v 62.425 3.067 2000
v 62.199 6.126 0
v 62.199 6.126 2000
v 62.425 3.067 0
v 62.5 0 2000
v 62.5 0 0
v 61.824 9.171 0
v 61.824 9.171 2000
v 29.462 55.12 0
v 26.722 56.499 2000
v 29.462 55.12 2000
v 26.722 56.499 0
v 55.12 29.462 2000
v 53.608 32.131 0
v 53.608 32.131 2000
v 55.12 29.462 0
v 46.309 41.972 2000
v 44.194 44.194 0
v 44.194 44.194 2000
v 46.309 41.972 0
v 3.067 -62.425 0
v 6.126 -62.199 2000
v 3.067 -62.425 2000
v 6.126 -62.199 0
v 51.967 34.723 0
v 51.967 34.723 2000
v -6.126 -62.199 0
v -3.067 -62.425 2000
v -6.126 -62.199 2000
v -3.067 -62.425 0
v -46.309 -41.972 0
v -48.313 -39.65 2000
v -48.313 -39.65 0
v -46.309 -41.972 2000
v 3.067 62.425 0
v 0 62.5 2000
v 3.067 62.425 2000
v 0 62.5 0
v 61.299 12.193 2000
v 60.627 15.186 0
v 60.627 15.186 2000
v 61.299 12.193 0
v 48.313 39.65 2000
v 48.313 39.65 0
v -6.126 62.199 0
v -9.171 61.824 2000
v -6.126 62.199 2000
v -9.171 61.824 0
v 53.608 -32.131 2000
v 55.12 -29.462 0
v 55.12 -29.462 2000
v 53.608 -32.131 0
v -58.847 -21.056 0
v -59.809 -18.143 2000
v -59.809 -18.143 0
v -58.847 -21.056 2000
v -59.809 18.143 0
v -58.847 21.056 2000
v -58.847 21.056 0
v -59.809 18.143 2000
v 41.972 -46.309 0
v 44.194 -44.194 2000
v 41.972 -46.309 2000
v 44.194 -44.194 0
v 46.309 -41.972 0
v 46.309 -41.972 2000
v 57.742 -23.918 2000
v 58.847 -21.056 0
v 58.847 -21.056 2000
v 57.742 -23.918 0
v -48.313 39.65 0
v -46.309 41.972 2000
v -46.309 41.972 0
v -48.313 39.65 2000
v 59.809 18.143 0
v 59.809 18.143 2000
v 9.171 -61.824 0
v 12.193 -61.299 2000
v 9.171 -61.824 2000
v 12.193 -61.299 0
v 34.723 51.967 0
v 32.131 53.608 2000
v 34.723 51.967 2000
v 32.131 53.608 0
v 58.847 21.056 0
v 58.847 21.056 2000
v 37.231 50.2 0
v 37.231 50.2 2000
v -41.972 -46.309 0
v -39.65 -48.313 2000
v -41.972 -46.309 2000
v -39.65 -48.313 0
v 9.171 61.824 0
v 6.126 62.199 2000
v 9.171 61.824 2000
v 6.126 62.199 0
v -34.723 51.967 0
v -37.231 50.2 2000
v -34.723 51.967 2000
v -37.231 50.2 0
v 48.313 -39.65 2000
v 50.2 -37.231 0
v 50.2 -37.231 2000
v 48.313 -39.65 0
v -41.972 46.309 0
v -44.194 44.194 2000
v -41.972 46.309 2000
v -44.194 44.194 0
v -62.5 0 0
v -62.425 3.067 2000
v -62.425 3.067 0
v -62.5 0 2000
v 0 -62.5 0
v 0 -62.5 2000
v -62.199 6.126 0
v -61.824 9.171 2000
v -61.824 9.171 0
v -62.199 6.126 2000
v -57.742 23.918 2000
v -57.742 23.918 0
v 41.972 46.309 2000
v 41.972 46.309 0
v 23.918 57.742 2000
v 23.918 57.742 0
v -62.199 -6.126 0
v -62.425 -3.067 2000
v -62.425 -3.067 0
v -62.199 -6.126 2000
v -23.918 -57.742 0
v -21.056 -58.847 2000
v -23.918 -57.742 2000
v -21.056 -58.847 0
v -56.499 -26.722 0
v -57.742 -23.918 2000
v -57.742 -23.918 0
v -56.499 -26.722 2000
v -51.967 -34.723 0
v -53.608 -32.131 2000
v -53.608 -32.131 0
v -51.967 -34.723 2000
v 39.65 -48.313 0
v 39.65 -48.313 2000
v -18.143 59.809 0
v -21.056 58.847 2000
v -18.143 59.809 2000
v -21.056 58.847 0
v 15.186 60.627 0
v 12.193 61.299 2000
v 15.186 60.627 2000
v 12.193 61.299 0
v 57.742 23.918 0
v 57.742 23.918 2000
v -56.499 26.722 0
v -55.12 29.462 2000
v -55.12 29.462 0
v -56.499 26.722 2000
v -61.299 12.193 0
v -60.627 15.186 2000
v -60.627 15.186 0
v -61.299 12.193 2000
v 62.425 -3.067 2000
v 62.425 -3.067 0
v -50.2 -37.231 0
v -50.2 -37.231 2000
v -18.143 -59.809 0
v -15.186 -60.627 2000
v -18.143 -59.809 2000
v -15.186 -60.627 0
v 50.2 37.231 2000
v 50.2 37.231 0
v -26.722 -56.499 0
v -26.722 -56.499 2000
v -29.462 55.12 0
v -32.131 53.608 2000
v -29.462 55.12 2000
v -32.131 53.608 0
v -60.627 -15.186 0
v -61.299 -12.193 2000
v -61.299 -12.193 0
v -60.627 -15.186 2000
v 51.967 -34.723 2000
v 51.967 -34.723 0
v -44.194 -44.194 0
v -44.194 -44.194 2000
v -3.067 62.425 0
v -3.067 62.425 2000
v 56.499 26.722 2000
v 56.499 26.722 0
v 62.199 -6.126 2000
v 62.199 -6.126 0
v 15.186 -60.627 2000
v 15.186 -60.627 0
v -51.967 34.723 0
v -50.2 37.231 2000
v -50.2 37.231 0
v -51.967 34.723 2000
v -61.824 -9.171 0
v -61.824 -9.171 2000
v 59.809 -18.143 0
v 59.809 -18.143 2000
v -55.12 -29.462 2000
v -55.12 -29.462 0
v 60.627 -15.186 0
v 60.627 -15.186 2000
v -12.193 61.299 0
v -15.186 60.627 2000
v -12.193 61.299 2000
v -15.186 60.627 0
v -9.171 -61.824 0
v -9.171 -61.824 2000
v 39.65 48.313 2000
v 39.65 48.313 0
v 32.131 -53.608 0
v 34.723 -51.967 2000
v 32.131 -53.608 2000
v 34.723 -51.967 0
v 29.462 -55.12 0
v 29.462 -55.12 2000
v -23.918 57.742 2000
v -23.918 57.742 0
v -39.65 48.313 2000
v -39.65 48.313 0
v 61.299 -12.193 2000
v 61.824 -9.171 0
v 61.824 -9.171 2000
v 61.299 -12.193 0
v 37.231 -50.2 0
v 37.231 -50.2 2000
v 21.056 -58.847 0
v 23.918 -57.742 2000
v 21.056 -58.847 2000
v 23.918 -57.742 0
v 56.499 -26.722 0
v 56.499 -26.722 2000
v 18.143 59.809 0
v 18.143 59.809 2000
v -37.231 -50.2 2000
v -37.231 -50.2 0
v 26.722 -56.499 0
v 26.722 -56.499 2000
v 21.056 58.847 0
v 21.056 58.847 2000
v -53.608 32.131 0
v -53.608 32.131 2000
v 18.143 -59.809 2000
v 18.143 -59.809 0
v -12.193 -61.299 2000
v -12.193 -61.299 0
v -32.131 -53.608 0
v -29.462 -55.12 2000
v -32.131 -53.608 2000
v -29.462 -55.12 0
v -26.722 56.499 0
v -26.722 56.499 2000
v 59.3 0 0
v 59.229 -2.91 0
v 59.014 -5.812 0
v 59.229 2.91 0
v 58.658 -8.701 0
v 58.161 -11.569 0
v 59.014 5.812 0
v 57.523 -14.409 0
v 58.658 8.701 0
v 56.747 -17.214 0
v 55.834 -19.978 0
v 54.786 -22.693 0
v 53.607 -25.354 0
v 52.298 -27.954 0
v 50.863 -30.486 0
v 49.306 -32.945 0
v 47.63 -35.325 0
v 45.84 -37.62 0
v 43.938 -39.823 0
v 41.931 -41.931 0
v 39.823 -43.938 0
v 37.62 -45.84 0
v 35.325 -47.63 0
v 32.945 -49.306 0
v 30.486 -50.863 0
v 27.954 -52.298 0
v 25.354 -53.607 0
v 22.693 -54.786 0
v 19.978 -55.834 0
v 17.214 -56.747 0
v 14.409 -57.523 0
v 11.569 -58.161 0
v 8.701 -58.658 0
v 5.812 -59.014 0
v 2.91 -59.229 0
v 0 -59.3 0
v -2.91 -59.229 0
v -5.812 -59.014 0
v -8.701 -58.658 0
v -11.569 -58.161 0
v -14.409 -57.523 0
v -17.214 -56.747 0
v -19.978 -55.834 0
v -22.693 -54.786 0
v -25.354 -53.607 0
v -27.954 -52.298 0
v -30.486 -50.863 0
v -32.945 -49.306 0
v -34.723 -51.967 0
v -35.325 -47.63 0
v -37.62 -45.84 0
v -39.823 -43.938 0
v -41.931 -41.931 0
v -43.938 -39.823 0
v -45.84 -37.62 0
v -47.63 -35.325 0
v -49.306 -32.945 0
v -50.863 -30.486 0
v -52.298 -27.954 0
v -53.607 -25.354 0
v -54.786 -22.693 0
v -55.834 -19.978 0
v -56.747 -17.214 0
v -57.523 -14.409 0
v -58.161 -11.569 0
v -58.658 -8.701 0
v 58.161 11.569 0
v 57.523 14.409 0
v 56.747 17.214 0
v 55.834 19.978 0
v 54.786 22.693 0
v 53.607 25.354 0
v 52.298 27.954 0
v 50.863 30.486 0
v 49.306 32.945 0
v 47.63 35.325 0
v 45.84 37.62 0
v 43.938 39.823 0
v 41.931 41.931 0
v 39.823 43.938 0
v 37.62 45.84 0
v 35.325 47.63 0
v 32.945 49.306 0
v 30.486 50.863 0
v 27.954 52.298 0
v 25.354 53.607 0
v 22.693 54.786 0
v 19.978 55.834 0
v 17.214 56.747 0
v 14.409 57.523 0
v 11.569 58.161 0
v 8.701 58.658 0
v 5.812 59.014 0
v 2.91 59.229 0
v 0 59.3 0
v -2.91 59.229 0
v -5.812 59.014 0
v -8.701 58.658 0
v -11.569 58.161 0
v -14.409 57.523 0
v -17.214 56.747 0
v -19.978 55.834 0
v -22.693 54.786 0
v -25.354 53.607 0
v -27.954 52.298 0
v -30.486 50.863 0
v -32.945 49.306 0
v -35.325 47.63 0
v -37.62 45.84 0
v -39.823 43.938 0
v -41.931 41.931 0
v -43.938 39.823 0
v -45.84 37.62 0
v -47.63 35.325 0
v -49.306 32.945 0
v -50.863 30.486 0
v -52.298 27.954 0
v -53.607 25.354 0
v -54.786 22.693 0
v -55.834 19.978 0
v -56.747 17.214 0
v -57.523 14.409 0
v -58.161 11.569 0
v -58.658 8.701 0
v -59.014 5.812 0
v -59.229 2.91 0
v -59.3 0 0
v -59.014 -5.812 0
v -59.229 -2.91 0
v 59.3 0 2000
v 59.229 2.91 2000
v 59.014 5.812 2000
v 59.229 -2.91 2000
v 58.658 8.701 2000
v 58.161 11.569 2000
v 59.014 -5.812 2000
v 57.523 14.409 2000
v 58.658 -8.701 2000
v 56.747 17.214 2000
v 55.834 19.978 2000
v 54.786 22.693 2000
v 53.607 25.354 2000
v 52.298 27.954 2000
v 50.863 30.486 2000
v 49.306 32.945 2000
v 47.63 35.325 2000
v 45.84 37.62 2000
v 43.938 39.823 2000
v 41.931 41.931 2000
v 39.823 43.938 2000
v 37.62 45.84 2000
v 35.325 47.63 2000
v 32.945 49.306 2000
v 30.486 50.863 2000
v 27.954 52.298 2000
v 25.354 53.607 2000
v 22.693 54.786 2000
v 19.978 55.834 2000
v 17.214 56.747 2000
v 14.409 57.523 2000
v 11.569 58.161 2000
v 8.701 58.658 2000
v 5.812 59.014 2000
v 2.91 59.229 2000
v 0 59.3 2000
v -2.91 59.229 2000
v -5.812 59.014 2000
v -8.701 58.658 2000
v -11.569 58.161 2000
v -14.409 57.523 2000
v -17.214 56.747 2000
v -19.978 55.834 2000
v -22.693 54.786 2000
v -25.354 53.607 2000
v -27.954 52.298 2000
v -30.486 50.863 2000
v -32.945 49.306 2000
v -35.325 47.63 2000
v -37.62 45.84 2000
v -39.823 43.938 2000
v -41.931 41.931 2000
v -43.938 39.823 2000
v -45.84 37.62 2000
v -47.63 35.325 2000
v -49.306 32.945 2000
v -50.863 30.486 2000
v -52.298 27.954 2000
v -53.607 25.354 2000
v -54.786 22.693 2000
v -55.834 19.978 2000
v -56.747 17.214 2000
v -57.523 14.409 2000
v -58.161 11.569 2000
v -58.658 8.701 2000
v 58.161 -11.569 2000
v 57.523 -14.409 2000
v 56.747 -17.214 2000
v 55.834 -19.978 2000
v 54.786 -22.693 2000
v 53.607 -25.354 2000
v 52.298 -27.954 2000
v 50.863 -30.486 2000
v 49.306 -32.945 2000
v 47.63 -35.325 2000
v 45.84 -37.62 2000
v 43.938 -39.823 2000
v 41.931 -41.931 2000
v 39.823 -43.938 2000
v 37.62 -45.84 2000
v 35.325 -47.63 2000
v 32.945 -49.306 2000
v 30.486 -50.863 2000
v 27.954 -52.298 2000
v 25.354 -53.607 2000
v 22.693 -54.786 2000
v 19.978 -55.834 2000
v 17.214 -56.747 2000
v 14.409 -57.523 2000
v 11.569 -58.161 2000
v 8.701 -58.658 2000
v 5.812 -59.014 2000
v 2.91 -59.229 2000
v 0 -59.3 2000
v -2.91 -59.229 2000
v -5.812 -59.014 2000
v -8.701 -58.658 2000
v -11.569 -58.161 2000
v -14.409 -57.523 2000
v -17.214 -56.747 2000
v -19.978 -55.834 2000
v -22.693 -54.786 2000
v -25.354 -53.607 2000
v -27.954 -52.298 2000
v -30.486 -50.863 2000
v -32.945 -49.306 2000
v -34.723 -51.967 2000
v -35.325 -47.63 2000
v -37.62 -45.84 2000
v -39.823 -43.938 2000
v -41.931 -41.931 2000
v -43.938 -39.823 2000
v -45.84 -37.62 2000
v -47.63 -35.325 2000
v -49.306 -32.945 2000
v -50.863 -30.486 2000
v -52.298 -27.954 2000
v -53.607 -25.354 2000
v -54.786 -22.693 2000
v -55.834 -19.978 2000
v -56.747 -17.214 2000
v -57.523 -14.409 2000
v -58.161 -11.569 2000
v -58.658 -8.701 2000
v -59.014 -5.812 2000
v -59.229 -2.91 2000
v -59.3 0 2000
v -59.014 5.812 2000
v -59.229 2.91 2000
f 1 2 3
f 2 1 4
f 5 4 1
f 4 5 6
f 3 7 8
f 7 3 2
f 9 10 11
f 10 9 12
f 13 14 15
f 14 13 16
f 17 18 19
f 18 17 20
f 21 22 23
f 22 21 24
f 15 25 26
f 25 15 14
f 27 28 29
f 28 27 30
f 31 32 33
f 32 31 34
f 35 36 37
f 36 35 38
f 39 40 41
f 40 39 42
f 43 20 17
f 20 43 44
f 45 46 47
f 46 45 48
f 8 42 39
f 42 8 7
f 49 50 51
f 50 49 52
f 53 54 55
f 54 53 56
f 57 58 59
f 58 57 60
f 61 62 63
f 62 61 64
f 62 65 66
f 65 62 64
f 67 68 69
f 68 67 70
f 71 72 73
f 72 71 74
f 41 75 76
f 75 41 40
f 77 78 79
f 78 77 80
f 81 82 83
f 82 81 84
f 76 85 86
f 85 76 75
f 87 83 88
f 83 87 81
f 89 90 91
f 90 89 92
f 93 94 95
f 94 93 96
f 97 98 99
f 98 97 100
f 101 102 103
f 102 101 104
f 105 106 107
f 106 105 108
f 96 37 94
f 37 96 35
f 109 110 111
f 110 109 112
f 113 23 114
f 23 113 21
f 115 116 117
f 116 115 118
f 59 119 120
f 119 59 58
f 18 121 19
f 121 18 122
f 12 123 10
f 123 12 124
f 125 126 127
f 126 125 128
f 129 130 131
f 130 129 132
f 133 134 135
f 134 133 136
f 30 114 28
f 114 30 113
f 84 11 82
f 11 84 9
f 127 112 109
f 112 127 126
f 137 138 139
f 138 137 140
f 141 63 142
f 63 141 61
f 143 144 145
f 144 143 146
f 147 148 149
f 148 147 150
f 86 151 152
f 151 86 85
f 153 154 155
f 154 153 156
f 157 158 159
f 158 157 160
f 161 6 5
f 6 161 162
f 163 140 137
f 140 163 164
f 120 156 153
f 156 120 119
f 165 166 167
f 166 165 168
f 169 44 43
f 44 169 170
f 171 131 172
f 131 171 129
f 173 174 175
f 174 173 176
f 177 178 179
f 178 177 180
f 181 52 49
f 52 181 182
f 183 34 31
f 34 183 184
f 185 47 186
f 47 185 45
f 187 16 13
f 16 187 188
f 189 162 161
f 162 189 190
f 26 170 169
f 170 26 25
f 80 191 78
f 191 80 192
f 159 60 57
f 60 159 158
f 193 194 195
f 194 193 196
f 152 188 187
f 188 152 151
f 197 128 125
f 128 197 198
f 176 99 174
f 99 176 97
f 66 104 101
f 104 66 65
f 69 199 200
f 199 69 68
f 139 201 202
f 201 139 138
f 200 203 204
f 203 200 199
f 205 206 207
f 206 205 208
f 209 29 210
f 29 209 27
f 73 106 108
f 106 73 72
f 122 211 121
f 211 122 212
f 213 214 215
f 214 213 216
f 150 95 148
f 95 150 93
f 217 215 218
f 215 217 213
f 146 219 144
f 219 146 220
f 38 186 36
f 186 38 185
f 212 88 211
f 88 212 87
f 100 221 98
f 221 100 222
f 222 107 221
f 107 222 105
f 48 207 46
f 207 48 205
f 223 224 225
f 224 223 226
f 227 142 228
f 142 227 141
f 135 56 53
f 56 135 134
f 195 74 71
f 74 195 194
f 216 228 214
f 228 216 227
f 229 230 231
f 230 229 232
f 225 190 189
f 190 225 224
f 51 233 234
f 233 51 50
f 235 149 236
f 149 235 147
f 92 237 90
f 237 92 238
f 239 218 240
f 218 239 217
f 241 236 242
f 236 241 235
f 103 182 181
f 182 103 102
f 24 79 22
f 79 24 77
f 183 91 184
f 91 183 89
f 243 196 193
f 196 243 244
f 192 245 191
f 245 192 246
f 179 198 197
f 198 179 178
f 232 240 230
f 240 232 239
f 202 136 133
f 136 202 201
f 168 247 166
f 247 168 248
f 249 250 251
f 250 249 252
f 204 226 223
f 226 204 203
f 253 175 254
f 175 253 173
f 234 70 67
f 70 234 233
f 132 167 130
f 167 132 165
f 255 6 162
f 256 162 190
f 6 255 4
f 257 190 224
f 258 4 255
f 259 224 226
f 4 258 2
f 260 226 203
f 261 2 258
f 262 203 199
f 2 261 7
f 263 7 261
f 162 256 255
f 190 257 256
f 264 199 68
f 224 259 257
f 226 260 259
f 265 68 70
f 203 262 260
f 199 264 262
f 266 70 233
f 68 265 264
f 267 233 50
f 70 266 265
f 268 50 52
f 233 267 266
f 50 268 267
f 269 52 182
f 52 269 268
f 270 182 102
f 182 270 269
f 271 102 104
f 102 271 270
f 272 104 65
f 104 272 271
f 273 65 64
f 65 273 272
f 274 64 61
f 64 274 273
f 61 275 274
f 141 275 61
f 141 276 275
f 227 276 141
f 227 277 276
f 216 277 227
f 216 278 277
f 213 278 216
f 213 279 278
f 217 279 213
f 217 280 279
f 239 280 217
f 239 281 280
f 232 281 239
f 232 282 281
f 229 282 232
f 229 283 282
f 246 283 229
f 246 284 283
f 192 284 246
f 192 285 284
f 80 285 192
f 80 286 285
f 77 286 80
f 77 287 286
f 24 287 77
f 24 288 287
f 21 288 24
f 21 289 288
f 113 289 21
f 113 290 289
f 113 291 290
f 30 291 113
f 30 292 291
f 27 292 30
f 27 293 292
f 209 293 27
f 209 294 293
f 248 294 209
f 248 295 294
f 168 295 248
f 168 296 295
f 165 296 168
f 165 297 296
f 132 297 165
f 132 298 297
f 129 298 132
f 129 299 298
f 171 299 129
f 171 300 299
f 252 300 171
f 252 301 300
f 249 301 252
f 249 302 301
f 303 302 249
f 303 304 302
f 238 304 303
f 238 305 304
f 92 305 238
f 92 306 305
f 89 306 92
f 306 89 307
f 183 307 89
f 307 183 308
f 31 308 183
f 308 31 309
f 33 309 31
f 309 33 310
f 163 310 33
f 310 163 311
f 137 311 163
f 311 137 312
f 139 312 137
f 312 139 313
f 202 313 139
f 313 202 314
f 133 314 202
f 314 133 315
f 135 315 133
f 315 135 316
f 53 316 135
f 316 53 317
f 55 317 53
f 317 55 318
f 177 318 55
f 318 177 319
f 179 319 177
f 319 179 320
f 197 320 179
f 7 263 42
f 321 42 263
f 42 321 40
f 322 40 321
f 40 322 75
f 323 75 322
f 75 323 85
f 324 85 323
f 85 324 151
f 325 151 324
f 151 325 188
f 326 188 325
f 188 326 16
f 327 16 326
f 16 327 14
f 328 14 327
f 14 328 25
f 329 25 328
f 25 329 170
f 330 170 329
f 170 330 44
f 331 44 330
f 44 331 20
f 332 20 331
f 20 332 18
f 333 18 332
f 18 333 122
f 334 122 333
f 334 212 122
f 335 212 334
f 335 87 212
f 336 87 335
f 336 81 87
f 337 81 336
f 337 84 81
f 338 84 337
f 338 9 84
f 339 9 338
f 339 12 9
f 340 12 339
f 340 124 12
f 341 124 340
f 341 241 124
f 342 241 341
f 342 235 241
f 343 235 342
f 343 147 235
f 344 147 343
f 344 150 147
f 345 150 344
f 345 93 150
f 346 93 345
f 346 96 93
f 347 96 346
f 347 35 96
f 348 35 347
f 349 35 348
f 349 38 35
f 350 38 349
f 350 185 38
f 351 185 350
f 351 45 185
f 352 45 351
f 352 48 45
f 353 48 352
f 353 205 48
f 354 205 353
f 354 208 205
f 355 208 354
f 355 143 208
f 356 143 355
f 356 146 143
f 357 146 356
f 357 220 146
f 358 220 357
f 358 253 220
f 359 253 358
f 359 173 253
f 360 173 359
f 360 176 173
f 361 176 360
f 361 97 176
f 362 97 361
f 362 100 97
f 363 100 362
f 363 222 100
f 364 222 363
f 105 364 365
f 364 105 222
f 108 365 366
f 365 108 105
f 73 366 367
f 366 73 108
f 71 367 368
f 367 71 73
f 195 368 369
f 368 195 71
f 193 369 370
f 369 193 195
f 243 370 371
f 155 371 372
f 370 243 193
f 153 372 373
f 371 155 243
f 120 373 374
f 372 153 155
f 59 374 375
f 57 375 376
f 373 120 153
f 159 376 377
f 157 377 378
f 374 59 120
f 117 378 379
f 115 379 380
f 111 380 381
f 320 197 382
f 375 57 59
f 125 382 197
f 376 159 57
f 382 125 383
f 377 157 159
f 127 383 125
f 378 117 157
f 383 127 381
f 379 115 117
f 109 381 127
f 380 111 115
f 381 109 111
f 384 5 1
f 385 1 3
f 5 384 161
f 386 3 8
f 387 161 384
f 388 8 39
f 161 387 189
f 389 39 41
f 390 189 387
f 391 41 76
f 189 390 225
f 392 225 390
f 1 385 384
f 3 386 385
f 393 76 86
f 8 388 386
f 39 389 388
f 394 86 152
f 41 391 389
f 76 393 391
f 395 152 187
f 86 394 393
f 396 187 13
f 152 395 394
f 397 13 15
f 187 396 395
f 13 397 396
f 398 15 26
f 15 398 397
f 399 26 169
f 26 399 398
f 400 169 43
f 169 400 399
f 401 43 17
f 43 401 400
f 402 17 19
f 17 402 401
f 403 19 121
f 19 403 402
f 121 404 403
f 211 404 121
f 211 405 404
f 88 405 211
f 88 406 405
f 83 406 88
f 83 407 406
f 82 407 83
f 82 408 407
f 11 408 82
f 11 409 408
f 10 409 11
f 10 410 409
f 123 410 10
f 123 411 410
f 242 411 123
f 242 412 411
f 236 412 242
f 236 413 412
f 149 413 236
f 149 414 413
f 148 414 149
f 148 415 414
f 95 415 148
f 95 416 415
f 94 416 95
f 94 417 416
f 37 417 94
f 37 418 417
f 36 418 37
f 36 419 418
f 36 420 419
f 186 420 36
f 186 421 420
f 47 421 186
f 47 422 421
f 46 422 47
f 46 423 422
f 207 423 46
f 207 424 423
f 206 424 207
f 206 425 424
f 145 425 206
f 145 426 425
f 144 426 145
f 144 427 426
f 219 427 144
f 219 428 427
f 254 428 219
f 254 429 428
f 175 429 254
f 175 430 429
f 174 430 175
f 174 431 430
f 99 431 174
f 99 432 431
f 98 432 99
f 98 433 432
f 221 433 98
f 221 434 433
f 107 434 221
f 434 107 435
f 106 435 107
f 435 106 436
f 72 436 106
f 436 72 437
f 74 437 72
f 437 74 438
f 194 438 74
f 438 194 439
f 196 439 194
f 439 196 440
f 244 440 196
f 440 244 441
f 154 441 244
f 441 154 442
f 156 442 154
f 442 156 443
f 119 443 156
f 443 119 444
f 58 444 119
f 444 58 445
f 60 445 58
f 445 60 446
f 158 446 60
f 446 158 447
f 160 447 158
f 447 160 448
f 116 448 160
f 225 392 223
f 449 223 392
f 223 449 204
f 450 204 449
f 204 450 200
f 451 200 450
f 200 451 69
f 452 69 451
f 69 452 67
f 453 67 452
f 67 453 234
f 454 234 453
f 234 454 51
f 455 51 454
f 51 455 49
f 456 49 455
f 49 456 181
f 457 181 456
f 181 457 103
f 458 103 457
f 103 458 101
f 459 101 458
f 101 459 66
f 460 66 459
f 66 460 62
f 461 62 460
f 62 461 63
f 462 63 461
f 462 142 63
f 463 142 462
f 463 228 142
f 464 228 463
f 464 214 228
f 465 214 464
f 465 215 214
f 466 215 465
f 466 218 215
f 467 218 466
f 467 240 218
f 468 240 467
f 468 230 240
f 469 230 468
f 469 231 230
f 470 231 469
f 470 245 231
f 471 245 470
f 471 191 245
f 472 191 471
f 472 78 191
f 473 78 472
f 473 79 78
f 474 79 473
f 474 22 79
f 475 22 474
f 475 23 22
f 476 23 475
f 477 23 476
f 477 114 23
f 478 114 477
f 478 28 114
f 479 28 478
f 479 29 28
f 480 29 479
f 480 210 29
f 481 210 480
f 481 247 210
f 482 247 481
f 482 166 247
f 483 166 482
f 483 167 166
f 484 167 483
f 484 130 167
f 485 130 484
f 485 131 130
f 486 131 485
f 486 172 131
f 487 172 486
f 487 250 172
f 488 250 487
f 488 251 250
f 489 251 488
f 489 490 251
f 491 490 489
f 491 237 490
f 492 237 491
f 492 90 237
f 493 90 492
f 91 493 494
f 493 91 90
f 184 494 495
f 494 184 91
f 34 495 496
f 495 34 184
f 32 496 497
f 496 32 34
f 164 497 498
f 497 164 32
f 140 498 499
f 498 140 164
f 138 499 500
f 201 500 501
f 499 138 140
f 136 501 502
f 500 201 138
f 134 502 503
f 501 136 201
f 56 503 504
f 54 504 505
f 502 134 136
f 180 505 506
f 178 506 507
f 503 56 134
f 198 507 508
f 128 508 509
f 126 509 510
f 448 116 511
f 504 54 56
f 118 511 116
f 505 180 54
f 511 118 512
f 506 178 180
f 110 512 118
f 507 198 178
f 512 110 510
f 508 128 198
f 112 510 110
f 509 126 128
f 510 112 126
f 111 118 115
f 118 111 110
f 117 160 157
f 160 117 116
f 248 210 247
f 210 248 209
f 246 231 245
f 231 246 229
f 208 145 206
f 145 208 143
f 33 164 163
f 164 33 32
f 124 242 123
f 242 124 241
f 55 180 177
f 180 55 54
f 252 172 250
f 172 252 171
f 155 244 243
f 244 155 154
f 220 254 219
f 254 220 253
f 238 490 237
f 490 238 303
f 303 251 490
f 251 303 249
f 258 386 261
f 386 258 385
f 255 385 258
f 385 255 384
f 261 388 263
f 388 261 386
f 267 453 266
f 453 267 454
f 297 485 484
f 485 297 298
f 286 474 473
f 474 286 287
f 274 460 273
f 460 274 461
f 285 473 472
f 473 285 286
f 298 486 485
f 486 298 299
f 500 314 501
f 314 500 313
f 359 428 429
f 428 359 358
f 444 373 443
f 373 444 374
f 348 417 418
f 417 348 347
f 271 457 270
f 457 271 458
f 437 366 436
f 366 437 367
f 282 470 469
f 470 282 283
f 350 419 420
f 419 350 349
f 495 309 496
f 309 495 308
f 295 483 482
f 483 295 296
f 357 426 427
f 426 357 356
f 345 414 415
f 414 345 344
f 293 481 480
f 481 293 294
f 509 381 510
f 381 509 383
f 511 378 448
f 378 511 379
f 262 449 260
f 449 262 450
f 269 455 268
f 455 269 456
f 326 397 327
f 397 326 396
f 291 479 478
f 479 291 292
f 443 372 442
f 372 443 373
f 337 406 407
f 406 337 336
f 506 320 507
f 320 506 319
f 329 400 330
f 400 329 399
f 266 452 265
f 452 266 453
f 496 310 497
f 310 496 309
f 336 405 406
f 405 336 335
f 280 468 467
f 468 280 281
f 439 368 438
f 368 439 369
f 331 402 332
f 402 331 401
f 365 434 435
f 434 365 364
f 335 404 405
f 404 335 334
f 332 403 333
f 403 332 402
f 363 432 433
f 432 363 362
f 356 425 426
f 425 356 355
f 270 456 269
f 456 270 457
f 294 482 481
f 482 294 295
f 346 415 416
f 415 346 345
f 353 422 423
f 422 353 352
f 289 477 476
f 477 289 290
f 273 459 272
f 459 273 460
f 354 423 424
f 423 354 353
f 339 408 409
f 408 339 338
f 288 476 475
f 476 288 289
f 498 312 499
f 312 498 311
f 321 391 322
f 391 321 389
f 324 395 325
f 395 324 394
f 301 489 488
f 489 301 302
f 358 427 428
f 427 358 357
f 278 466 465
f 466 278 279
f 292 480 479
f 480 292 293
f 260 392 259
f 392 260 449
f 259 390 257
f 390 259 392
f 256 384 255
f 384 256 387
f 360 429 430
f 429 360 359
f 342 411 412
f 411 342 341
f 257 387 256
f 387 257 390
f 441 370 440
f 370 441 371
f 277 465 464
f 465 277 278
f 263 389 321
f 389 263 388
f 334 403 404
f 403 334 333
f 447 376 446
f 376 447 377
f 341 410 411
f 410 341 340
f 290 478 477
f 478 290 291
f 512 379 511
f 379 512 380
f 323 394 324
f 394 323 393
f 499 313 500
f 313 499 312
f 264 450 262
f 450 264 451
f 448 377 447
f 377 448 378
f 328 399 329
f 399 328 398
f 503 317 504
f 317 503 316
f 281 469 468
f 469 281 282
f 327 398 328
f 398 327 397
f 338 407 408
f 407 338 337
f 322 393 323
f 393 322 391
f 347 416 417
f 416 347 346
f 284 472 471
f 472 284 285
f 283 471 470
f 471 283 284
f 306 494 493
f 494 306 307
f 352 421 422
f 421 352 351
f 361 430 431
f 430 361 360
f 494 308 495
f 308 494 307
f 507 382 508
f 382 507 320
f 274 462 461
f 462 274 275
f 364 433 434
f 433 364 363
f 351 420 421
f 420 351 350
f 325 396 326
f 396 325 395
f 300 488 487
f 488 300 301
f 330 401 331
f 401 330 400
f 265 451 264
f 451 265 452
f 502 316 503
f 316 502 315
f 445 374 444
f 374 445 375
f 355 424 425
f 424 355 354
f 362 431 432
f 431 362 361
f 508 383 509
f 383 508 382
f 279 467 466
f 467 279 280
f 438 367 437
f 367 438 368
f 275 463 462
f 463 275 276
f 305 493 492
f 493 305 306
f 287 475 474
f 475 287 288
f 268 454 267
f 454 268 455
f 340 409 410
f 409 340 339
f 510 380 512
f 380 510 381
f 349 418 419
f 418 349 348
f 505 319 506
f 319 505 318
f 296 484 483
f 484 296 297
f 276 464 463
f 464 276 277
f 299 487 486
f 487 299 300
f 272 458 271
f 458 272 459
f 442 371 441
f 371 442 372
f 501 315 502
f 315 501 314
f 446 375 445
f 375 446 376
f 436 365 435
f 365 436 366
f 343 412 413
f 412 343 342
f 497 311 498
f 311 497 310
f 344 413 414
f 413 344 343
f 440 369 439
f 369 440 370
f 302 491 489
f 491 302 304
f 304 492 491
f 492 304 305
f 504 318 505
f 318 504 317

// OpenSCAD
$fn = 128;

// HT pipe parameters (mm)
pipe_dn = 125;          // nominal diameter
pipe_length = 2000;     // length
wall_thickness = 3.2;   // typical HT wall thickness (approx.)

// Derived
outer_d = pipe_dn;
inner_d = max(outer_d - 2*wall_thickness, 0.1);

module ht_pipe(od, id, L) {
    difference() {
        cylinder(h = L, d = od, center = false);
        translate([0,0,-0.5])
            cylinder(h = L + 1, d = id, center = false);
    }
}

ht_pipe(outer_d, inner_d, pipe_length);
